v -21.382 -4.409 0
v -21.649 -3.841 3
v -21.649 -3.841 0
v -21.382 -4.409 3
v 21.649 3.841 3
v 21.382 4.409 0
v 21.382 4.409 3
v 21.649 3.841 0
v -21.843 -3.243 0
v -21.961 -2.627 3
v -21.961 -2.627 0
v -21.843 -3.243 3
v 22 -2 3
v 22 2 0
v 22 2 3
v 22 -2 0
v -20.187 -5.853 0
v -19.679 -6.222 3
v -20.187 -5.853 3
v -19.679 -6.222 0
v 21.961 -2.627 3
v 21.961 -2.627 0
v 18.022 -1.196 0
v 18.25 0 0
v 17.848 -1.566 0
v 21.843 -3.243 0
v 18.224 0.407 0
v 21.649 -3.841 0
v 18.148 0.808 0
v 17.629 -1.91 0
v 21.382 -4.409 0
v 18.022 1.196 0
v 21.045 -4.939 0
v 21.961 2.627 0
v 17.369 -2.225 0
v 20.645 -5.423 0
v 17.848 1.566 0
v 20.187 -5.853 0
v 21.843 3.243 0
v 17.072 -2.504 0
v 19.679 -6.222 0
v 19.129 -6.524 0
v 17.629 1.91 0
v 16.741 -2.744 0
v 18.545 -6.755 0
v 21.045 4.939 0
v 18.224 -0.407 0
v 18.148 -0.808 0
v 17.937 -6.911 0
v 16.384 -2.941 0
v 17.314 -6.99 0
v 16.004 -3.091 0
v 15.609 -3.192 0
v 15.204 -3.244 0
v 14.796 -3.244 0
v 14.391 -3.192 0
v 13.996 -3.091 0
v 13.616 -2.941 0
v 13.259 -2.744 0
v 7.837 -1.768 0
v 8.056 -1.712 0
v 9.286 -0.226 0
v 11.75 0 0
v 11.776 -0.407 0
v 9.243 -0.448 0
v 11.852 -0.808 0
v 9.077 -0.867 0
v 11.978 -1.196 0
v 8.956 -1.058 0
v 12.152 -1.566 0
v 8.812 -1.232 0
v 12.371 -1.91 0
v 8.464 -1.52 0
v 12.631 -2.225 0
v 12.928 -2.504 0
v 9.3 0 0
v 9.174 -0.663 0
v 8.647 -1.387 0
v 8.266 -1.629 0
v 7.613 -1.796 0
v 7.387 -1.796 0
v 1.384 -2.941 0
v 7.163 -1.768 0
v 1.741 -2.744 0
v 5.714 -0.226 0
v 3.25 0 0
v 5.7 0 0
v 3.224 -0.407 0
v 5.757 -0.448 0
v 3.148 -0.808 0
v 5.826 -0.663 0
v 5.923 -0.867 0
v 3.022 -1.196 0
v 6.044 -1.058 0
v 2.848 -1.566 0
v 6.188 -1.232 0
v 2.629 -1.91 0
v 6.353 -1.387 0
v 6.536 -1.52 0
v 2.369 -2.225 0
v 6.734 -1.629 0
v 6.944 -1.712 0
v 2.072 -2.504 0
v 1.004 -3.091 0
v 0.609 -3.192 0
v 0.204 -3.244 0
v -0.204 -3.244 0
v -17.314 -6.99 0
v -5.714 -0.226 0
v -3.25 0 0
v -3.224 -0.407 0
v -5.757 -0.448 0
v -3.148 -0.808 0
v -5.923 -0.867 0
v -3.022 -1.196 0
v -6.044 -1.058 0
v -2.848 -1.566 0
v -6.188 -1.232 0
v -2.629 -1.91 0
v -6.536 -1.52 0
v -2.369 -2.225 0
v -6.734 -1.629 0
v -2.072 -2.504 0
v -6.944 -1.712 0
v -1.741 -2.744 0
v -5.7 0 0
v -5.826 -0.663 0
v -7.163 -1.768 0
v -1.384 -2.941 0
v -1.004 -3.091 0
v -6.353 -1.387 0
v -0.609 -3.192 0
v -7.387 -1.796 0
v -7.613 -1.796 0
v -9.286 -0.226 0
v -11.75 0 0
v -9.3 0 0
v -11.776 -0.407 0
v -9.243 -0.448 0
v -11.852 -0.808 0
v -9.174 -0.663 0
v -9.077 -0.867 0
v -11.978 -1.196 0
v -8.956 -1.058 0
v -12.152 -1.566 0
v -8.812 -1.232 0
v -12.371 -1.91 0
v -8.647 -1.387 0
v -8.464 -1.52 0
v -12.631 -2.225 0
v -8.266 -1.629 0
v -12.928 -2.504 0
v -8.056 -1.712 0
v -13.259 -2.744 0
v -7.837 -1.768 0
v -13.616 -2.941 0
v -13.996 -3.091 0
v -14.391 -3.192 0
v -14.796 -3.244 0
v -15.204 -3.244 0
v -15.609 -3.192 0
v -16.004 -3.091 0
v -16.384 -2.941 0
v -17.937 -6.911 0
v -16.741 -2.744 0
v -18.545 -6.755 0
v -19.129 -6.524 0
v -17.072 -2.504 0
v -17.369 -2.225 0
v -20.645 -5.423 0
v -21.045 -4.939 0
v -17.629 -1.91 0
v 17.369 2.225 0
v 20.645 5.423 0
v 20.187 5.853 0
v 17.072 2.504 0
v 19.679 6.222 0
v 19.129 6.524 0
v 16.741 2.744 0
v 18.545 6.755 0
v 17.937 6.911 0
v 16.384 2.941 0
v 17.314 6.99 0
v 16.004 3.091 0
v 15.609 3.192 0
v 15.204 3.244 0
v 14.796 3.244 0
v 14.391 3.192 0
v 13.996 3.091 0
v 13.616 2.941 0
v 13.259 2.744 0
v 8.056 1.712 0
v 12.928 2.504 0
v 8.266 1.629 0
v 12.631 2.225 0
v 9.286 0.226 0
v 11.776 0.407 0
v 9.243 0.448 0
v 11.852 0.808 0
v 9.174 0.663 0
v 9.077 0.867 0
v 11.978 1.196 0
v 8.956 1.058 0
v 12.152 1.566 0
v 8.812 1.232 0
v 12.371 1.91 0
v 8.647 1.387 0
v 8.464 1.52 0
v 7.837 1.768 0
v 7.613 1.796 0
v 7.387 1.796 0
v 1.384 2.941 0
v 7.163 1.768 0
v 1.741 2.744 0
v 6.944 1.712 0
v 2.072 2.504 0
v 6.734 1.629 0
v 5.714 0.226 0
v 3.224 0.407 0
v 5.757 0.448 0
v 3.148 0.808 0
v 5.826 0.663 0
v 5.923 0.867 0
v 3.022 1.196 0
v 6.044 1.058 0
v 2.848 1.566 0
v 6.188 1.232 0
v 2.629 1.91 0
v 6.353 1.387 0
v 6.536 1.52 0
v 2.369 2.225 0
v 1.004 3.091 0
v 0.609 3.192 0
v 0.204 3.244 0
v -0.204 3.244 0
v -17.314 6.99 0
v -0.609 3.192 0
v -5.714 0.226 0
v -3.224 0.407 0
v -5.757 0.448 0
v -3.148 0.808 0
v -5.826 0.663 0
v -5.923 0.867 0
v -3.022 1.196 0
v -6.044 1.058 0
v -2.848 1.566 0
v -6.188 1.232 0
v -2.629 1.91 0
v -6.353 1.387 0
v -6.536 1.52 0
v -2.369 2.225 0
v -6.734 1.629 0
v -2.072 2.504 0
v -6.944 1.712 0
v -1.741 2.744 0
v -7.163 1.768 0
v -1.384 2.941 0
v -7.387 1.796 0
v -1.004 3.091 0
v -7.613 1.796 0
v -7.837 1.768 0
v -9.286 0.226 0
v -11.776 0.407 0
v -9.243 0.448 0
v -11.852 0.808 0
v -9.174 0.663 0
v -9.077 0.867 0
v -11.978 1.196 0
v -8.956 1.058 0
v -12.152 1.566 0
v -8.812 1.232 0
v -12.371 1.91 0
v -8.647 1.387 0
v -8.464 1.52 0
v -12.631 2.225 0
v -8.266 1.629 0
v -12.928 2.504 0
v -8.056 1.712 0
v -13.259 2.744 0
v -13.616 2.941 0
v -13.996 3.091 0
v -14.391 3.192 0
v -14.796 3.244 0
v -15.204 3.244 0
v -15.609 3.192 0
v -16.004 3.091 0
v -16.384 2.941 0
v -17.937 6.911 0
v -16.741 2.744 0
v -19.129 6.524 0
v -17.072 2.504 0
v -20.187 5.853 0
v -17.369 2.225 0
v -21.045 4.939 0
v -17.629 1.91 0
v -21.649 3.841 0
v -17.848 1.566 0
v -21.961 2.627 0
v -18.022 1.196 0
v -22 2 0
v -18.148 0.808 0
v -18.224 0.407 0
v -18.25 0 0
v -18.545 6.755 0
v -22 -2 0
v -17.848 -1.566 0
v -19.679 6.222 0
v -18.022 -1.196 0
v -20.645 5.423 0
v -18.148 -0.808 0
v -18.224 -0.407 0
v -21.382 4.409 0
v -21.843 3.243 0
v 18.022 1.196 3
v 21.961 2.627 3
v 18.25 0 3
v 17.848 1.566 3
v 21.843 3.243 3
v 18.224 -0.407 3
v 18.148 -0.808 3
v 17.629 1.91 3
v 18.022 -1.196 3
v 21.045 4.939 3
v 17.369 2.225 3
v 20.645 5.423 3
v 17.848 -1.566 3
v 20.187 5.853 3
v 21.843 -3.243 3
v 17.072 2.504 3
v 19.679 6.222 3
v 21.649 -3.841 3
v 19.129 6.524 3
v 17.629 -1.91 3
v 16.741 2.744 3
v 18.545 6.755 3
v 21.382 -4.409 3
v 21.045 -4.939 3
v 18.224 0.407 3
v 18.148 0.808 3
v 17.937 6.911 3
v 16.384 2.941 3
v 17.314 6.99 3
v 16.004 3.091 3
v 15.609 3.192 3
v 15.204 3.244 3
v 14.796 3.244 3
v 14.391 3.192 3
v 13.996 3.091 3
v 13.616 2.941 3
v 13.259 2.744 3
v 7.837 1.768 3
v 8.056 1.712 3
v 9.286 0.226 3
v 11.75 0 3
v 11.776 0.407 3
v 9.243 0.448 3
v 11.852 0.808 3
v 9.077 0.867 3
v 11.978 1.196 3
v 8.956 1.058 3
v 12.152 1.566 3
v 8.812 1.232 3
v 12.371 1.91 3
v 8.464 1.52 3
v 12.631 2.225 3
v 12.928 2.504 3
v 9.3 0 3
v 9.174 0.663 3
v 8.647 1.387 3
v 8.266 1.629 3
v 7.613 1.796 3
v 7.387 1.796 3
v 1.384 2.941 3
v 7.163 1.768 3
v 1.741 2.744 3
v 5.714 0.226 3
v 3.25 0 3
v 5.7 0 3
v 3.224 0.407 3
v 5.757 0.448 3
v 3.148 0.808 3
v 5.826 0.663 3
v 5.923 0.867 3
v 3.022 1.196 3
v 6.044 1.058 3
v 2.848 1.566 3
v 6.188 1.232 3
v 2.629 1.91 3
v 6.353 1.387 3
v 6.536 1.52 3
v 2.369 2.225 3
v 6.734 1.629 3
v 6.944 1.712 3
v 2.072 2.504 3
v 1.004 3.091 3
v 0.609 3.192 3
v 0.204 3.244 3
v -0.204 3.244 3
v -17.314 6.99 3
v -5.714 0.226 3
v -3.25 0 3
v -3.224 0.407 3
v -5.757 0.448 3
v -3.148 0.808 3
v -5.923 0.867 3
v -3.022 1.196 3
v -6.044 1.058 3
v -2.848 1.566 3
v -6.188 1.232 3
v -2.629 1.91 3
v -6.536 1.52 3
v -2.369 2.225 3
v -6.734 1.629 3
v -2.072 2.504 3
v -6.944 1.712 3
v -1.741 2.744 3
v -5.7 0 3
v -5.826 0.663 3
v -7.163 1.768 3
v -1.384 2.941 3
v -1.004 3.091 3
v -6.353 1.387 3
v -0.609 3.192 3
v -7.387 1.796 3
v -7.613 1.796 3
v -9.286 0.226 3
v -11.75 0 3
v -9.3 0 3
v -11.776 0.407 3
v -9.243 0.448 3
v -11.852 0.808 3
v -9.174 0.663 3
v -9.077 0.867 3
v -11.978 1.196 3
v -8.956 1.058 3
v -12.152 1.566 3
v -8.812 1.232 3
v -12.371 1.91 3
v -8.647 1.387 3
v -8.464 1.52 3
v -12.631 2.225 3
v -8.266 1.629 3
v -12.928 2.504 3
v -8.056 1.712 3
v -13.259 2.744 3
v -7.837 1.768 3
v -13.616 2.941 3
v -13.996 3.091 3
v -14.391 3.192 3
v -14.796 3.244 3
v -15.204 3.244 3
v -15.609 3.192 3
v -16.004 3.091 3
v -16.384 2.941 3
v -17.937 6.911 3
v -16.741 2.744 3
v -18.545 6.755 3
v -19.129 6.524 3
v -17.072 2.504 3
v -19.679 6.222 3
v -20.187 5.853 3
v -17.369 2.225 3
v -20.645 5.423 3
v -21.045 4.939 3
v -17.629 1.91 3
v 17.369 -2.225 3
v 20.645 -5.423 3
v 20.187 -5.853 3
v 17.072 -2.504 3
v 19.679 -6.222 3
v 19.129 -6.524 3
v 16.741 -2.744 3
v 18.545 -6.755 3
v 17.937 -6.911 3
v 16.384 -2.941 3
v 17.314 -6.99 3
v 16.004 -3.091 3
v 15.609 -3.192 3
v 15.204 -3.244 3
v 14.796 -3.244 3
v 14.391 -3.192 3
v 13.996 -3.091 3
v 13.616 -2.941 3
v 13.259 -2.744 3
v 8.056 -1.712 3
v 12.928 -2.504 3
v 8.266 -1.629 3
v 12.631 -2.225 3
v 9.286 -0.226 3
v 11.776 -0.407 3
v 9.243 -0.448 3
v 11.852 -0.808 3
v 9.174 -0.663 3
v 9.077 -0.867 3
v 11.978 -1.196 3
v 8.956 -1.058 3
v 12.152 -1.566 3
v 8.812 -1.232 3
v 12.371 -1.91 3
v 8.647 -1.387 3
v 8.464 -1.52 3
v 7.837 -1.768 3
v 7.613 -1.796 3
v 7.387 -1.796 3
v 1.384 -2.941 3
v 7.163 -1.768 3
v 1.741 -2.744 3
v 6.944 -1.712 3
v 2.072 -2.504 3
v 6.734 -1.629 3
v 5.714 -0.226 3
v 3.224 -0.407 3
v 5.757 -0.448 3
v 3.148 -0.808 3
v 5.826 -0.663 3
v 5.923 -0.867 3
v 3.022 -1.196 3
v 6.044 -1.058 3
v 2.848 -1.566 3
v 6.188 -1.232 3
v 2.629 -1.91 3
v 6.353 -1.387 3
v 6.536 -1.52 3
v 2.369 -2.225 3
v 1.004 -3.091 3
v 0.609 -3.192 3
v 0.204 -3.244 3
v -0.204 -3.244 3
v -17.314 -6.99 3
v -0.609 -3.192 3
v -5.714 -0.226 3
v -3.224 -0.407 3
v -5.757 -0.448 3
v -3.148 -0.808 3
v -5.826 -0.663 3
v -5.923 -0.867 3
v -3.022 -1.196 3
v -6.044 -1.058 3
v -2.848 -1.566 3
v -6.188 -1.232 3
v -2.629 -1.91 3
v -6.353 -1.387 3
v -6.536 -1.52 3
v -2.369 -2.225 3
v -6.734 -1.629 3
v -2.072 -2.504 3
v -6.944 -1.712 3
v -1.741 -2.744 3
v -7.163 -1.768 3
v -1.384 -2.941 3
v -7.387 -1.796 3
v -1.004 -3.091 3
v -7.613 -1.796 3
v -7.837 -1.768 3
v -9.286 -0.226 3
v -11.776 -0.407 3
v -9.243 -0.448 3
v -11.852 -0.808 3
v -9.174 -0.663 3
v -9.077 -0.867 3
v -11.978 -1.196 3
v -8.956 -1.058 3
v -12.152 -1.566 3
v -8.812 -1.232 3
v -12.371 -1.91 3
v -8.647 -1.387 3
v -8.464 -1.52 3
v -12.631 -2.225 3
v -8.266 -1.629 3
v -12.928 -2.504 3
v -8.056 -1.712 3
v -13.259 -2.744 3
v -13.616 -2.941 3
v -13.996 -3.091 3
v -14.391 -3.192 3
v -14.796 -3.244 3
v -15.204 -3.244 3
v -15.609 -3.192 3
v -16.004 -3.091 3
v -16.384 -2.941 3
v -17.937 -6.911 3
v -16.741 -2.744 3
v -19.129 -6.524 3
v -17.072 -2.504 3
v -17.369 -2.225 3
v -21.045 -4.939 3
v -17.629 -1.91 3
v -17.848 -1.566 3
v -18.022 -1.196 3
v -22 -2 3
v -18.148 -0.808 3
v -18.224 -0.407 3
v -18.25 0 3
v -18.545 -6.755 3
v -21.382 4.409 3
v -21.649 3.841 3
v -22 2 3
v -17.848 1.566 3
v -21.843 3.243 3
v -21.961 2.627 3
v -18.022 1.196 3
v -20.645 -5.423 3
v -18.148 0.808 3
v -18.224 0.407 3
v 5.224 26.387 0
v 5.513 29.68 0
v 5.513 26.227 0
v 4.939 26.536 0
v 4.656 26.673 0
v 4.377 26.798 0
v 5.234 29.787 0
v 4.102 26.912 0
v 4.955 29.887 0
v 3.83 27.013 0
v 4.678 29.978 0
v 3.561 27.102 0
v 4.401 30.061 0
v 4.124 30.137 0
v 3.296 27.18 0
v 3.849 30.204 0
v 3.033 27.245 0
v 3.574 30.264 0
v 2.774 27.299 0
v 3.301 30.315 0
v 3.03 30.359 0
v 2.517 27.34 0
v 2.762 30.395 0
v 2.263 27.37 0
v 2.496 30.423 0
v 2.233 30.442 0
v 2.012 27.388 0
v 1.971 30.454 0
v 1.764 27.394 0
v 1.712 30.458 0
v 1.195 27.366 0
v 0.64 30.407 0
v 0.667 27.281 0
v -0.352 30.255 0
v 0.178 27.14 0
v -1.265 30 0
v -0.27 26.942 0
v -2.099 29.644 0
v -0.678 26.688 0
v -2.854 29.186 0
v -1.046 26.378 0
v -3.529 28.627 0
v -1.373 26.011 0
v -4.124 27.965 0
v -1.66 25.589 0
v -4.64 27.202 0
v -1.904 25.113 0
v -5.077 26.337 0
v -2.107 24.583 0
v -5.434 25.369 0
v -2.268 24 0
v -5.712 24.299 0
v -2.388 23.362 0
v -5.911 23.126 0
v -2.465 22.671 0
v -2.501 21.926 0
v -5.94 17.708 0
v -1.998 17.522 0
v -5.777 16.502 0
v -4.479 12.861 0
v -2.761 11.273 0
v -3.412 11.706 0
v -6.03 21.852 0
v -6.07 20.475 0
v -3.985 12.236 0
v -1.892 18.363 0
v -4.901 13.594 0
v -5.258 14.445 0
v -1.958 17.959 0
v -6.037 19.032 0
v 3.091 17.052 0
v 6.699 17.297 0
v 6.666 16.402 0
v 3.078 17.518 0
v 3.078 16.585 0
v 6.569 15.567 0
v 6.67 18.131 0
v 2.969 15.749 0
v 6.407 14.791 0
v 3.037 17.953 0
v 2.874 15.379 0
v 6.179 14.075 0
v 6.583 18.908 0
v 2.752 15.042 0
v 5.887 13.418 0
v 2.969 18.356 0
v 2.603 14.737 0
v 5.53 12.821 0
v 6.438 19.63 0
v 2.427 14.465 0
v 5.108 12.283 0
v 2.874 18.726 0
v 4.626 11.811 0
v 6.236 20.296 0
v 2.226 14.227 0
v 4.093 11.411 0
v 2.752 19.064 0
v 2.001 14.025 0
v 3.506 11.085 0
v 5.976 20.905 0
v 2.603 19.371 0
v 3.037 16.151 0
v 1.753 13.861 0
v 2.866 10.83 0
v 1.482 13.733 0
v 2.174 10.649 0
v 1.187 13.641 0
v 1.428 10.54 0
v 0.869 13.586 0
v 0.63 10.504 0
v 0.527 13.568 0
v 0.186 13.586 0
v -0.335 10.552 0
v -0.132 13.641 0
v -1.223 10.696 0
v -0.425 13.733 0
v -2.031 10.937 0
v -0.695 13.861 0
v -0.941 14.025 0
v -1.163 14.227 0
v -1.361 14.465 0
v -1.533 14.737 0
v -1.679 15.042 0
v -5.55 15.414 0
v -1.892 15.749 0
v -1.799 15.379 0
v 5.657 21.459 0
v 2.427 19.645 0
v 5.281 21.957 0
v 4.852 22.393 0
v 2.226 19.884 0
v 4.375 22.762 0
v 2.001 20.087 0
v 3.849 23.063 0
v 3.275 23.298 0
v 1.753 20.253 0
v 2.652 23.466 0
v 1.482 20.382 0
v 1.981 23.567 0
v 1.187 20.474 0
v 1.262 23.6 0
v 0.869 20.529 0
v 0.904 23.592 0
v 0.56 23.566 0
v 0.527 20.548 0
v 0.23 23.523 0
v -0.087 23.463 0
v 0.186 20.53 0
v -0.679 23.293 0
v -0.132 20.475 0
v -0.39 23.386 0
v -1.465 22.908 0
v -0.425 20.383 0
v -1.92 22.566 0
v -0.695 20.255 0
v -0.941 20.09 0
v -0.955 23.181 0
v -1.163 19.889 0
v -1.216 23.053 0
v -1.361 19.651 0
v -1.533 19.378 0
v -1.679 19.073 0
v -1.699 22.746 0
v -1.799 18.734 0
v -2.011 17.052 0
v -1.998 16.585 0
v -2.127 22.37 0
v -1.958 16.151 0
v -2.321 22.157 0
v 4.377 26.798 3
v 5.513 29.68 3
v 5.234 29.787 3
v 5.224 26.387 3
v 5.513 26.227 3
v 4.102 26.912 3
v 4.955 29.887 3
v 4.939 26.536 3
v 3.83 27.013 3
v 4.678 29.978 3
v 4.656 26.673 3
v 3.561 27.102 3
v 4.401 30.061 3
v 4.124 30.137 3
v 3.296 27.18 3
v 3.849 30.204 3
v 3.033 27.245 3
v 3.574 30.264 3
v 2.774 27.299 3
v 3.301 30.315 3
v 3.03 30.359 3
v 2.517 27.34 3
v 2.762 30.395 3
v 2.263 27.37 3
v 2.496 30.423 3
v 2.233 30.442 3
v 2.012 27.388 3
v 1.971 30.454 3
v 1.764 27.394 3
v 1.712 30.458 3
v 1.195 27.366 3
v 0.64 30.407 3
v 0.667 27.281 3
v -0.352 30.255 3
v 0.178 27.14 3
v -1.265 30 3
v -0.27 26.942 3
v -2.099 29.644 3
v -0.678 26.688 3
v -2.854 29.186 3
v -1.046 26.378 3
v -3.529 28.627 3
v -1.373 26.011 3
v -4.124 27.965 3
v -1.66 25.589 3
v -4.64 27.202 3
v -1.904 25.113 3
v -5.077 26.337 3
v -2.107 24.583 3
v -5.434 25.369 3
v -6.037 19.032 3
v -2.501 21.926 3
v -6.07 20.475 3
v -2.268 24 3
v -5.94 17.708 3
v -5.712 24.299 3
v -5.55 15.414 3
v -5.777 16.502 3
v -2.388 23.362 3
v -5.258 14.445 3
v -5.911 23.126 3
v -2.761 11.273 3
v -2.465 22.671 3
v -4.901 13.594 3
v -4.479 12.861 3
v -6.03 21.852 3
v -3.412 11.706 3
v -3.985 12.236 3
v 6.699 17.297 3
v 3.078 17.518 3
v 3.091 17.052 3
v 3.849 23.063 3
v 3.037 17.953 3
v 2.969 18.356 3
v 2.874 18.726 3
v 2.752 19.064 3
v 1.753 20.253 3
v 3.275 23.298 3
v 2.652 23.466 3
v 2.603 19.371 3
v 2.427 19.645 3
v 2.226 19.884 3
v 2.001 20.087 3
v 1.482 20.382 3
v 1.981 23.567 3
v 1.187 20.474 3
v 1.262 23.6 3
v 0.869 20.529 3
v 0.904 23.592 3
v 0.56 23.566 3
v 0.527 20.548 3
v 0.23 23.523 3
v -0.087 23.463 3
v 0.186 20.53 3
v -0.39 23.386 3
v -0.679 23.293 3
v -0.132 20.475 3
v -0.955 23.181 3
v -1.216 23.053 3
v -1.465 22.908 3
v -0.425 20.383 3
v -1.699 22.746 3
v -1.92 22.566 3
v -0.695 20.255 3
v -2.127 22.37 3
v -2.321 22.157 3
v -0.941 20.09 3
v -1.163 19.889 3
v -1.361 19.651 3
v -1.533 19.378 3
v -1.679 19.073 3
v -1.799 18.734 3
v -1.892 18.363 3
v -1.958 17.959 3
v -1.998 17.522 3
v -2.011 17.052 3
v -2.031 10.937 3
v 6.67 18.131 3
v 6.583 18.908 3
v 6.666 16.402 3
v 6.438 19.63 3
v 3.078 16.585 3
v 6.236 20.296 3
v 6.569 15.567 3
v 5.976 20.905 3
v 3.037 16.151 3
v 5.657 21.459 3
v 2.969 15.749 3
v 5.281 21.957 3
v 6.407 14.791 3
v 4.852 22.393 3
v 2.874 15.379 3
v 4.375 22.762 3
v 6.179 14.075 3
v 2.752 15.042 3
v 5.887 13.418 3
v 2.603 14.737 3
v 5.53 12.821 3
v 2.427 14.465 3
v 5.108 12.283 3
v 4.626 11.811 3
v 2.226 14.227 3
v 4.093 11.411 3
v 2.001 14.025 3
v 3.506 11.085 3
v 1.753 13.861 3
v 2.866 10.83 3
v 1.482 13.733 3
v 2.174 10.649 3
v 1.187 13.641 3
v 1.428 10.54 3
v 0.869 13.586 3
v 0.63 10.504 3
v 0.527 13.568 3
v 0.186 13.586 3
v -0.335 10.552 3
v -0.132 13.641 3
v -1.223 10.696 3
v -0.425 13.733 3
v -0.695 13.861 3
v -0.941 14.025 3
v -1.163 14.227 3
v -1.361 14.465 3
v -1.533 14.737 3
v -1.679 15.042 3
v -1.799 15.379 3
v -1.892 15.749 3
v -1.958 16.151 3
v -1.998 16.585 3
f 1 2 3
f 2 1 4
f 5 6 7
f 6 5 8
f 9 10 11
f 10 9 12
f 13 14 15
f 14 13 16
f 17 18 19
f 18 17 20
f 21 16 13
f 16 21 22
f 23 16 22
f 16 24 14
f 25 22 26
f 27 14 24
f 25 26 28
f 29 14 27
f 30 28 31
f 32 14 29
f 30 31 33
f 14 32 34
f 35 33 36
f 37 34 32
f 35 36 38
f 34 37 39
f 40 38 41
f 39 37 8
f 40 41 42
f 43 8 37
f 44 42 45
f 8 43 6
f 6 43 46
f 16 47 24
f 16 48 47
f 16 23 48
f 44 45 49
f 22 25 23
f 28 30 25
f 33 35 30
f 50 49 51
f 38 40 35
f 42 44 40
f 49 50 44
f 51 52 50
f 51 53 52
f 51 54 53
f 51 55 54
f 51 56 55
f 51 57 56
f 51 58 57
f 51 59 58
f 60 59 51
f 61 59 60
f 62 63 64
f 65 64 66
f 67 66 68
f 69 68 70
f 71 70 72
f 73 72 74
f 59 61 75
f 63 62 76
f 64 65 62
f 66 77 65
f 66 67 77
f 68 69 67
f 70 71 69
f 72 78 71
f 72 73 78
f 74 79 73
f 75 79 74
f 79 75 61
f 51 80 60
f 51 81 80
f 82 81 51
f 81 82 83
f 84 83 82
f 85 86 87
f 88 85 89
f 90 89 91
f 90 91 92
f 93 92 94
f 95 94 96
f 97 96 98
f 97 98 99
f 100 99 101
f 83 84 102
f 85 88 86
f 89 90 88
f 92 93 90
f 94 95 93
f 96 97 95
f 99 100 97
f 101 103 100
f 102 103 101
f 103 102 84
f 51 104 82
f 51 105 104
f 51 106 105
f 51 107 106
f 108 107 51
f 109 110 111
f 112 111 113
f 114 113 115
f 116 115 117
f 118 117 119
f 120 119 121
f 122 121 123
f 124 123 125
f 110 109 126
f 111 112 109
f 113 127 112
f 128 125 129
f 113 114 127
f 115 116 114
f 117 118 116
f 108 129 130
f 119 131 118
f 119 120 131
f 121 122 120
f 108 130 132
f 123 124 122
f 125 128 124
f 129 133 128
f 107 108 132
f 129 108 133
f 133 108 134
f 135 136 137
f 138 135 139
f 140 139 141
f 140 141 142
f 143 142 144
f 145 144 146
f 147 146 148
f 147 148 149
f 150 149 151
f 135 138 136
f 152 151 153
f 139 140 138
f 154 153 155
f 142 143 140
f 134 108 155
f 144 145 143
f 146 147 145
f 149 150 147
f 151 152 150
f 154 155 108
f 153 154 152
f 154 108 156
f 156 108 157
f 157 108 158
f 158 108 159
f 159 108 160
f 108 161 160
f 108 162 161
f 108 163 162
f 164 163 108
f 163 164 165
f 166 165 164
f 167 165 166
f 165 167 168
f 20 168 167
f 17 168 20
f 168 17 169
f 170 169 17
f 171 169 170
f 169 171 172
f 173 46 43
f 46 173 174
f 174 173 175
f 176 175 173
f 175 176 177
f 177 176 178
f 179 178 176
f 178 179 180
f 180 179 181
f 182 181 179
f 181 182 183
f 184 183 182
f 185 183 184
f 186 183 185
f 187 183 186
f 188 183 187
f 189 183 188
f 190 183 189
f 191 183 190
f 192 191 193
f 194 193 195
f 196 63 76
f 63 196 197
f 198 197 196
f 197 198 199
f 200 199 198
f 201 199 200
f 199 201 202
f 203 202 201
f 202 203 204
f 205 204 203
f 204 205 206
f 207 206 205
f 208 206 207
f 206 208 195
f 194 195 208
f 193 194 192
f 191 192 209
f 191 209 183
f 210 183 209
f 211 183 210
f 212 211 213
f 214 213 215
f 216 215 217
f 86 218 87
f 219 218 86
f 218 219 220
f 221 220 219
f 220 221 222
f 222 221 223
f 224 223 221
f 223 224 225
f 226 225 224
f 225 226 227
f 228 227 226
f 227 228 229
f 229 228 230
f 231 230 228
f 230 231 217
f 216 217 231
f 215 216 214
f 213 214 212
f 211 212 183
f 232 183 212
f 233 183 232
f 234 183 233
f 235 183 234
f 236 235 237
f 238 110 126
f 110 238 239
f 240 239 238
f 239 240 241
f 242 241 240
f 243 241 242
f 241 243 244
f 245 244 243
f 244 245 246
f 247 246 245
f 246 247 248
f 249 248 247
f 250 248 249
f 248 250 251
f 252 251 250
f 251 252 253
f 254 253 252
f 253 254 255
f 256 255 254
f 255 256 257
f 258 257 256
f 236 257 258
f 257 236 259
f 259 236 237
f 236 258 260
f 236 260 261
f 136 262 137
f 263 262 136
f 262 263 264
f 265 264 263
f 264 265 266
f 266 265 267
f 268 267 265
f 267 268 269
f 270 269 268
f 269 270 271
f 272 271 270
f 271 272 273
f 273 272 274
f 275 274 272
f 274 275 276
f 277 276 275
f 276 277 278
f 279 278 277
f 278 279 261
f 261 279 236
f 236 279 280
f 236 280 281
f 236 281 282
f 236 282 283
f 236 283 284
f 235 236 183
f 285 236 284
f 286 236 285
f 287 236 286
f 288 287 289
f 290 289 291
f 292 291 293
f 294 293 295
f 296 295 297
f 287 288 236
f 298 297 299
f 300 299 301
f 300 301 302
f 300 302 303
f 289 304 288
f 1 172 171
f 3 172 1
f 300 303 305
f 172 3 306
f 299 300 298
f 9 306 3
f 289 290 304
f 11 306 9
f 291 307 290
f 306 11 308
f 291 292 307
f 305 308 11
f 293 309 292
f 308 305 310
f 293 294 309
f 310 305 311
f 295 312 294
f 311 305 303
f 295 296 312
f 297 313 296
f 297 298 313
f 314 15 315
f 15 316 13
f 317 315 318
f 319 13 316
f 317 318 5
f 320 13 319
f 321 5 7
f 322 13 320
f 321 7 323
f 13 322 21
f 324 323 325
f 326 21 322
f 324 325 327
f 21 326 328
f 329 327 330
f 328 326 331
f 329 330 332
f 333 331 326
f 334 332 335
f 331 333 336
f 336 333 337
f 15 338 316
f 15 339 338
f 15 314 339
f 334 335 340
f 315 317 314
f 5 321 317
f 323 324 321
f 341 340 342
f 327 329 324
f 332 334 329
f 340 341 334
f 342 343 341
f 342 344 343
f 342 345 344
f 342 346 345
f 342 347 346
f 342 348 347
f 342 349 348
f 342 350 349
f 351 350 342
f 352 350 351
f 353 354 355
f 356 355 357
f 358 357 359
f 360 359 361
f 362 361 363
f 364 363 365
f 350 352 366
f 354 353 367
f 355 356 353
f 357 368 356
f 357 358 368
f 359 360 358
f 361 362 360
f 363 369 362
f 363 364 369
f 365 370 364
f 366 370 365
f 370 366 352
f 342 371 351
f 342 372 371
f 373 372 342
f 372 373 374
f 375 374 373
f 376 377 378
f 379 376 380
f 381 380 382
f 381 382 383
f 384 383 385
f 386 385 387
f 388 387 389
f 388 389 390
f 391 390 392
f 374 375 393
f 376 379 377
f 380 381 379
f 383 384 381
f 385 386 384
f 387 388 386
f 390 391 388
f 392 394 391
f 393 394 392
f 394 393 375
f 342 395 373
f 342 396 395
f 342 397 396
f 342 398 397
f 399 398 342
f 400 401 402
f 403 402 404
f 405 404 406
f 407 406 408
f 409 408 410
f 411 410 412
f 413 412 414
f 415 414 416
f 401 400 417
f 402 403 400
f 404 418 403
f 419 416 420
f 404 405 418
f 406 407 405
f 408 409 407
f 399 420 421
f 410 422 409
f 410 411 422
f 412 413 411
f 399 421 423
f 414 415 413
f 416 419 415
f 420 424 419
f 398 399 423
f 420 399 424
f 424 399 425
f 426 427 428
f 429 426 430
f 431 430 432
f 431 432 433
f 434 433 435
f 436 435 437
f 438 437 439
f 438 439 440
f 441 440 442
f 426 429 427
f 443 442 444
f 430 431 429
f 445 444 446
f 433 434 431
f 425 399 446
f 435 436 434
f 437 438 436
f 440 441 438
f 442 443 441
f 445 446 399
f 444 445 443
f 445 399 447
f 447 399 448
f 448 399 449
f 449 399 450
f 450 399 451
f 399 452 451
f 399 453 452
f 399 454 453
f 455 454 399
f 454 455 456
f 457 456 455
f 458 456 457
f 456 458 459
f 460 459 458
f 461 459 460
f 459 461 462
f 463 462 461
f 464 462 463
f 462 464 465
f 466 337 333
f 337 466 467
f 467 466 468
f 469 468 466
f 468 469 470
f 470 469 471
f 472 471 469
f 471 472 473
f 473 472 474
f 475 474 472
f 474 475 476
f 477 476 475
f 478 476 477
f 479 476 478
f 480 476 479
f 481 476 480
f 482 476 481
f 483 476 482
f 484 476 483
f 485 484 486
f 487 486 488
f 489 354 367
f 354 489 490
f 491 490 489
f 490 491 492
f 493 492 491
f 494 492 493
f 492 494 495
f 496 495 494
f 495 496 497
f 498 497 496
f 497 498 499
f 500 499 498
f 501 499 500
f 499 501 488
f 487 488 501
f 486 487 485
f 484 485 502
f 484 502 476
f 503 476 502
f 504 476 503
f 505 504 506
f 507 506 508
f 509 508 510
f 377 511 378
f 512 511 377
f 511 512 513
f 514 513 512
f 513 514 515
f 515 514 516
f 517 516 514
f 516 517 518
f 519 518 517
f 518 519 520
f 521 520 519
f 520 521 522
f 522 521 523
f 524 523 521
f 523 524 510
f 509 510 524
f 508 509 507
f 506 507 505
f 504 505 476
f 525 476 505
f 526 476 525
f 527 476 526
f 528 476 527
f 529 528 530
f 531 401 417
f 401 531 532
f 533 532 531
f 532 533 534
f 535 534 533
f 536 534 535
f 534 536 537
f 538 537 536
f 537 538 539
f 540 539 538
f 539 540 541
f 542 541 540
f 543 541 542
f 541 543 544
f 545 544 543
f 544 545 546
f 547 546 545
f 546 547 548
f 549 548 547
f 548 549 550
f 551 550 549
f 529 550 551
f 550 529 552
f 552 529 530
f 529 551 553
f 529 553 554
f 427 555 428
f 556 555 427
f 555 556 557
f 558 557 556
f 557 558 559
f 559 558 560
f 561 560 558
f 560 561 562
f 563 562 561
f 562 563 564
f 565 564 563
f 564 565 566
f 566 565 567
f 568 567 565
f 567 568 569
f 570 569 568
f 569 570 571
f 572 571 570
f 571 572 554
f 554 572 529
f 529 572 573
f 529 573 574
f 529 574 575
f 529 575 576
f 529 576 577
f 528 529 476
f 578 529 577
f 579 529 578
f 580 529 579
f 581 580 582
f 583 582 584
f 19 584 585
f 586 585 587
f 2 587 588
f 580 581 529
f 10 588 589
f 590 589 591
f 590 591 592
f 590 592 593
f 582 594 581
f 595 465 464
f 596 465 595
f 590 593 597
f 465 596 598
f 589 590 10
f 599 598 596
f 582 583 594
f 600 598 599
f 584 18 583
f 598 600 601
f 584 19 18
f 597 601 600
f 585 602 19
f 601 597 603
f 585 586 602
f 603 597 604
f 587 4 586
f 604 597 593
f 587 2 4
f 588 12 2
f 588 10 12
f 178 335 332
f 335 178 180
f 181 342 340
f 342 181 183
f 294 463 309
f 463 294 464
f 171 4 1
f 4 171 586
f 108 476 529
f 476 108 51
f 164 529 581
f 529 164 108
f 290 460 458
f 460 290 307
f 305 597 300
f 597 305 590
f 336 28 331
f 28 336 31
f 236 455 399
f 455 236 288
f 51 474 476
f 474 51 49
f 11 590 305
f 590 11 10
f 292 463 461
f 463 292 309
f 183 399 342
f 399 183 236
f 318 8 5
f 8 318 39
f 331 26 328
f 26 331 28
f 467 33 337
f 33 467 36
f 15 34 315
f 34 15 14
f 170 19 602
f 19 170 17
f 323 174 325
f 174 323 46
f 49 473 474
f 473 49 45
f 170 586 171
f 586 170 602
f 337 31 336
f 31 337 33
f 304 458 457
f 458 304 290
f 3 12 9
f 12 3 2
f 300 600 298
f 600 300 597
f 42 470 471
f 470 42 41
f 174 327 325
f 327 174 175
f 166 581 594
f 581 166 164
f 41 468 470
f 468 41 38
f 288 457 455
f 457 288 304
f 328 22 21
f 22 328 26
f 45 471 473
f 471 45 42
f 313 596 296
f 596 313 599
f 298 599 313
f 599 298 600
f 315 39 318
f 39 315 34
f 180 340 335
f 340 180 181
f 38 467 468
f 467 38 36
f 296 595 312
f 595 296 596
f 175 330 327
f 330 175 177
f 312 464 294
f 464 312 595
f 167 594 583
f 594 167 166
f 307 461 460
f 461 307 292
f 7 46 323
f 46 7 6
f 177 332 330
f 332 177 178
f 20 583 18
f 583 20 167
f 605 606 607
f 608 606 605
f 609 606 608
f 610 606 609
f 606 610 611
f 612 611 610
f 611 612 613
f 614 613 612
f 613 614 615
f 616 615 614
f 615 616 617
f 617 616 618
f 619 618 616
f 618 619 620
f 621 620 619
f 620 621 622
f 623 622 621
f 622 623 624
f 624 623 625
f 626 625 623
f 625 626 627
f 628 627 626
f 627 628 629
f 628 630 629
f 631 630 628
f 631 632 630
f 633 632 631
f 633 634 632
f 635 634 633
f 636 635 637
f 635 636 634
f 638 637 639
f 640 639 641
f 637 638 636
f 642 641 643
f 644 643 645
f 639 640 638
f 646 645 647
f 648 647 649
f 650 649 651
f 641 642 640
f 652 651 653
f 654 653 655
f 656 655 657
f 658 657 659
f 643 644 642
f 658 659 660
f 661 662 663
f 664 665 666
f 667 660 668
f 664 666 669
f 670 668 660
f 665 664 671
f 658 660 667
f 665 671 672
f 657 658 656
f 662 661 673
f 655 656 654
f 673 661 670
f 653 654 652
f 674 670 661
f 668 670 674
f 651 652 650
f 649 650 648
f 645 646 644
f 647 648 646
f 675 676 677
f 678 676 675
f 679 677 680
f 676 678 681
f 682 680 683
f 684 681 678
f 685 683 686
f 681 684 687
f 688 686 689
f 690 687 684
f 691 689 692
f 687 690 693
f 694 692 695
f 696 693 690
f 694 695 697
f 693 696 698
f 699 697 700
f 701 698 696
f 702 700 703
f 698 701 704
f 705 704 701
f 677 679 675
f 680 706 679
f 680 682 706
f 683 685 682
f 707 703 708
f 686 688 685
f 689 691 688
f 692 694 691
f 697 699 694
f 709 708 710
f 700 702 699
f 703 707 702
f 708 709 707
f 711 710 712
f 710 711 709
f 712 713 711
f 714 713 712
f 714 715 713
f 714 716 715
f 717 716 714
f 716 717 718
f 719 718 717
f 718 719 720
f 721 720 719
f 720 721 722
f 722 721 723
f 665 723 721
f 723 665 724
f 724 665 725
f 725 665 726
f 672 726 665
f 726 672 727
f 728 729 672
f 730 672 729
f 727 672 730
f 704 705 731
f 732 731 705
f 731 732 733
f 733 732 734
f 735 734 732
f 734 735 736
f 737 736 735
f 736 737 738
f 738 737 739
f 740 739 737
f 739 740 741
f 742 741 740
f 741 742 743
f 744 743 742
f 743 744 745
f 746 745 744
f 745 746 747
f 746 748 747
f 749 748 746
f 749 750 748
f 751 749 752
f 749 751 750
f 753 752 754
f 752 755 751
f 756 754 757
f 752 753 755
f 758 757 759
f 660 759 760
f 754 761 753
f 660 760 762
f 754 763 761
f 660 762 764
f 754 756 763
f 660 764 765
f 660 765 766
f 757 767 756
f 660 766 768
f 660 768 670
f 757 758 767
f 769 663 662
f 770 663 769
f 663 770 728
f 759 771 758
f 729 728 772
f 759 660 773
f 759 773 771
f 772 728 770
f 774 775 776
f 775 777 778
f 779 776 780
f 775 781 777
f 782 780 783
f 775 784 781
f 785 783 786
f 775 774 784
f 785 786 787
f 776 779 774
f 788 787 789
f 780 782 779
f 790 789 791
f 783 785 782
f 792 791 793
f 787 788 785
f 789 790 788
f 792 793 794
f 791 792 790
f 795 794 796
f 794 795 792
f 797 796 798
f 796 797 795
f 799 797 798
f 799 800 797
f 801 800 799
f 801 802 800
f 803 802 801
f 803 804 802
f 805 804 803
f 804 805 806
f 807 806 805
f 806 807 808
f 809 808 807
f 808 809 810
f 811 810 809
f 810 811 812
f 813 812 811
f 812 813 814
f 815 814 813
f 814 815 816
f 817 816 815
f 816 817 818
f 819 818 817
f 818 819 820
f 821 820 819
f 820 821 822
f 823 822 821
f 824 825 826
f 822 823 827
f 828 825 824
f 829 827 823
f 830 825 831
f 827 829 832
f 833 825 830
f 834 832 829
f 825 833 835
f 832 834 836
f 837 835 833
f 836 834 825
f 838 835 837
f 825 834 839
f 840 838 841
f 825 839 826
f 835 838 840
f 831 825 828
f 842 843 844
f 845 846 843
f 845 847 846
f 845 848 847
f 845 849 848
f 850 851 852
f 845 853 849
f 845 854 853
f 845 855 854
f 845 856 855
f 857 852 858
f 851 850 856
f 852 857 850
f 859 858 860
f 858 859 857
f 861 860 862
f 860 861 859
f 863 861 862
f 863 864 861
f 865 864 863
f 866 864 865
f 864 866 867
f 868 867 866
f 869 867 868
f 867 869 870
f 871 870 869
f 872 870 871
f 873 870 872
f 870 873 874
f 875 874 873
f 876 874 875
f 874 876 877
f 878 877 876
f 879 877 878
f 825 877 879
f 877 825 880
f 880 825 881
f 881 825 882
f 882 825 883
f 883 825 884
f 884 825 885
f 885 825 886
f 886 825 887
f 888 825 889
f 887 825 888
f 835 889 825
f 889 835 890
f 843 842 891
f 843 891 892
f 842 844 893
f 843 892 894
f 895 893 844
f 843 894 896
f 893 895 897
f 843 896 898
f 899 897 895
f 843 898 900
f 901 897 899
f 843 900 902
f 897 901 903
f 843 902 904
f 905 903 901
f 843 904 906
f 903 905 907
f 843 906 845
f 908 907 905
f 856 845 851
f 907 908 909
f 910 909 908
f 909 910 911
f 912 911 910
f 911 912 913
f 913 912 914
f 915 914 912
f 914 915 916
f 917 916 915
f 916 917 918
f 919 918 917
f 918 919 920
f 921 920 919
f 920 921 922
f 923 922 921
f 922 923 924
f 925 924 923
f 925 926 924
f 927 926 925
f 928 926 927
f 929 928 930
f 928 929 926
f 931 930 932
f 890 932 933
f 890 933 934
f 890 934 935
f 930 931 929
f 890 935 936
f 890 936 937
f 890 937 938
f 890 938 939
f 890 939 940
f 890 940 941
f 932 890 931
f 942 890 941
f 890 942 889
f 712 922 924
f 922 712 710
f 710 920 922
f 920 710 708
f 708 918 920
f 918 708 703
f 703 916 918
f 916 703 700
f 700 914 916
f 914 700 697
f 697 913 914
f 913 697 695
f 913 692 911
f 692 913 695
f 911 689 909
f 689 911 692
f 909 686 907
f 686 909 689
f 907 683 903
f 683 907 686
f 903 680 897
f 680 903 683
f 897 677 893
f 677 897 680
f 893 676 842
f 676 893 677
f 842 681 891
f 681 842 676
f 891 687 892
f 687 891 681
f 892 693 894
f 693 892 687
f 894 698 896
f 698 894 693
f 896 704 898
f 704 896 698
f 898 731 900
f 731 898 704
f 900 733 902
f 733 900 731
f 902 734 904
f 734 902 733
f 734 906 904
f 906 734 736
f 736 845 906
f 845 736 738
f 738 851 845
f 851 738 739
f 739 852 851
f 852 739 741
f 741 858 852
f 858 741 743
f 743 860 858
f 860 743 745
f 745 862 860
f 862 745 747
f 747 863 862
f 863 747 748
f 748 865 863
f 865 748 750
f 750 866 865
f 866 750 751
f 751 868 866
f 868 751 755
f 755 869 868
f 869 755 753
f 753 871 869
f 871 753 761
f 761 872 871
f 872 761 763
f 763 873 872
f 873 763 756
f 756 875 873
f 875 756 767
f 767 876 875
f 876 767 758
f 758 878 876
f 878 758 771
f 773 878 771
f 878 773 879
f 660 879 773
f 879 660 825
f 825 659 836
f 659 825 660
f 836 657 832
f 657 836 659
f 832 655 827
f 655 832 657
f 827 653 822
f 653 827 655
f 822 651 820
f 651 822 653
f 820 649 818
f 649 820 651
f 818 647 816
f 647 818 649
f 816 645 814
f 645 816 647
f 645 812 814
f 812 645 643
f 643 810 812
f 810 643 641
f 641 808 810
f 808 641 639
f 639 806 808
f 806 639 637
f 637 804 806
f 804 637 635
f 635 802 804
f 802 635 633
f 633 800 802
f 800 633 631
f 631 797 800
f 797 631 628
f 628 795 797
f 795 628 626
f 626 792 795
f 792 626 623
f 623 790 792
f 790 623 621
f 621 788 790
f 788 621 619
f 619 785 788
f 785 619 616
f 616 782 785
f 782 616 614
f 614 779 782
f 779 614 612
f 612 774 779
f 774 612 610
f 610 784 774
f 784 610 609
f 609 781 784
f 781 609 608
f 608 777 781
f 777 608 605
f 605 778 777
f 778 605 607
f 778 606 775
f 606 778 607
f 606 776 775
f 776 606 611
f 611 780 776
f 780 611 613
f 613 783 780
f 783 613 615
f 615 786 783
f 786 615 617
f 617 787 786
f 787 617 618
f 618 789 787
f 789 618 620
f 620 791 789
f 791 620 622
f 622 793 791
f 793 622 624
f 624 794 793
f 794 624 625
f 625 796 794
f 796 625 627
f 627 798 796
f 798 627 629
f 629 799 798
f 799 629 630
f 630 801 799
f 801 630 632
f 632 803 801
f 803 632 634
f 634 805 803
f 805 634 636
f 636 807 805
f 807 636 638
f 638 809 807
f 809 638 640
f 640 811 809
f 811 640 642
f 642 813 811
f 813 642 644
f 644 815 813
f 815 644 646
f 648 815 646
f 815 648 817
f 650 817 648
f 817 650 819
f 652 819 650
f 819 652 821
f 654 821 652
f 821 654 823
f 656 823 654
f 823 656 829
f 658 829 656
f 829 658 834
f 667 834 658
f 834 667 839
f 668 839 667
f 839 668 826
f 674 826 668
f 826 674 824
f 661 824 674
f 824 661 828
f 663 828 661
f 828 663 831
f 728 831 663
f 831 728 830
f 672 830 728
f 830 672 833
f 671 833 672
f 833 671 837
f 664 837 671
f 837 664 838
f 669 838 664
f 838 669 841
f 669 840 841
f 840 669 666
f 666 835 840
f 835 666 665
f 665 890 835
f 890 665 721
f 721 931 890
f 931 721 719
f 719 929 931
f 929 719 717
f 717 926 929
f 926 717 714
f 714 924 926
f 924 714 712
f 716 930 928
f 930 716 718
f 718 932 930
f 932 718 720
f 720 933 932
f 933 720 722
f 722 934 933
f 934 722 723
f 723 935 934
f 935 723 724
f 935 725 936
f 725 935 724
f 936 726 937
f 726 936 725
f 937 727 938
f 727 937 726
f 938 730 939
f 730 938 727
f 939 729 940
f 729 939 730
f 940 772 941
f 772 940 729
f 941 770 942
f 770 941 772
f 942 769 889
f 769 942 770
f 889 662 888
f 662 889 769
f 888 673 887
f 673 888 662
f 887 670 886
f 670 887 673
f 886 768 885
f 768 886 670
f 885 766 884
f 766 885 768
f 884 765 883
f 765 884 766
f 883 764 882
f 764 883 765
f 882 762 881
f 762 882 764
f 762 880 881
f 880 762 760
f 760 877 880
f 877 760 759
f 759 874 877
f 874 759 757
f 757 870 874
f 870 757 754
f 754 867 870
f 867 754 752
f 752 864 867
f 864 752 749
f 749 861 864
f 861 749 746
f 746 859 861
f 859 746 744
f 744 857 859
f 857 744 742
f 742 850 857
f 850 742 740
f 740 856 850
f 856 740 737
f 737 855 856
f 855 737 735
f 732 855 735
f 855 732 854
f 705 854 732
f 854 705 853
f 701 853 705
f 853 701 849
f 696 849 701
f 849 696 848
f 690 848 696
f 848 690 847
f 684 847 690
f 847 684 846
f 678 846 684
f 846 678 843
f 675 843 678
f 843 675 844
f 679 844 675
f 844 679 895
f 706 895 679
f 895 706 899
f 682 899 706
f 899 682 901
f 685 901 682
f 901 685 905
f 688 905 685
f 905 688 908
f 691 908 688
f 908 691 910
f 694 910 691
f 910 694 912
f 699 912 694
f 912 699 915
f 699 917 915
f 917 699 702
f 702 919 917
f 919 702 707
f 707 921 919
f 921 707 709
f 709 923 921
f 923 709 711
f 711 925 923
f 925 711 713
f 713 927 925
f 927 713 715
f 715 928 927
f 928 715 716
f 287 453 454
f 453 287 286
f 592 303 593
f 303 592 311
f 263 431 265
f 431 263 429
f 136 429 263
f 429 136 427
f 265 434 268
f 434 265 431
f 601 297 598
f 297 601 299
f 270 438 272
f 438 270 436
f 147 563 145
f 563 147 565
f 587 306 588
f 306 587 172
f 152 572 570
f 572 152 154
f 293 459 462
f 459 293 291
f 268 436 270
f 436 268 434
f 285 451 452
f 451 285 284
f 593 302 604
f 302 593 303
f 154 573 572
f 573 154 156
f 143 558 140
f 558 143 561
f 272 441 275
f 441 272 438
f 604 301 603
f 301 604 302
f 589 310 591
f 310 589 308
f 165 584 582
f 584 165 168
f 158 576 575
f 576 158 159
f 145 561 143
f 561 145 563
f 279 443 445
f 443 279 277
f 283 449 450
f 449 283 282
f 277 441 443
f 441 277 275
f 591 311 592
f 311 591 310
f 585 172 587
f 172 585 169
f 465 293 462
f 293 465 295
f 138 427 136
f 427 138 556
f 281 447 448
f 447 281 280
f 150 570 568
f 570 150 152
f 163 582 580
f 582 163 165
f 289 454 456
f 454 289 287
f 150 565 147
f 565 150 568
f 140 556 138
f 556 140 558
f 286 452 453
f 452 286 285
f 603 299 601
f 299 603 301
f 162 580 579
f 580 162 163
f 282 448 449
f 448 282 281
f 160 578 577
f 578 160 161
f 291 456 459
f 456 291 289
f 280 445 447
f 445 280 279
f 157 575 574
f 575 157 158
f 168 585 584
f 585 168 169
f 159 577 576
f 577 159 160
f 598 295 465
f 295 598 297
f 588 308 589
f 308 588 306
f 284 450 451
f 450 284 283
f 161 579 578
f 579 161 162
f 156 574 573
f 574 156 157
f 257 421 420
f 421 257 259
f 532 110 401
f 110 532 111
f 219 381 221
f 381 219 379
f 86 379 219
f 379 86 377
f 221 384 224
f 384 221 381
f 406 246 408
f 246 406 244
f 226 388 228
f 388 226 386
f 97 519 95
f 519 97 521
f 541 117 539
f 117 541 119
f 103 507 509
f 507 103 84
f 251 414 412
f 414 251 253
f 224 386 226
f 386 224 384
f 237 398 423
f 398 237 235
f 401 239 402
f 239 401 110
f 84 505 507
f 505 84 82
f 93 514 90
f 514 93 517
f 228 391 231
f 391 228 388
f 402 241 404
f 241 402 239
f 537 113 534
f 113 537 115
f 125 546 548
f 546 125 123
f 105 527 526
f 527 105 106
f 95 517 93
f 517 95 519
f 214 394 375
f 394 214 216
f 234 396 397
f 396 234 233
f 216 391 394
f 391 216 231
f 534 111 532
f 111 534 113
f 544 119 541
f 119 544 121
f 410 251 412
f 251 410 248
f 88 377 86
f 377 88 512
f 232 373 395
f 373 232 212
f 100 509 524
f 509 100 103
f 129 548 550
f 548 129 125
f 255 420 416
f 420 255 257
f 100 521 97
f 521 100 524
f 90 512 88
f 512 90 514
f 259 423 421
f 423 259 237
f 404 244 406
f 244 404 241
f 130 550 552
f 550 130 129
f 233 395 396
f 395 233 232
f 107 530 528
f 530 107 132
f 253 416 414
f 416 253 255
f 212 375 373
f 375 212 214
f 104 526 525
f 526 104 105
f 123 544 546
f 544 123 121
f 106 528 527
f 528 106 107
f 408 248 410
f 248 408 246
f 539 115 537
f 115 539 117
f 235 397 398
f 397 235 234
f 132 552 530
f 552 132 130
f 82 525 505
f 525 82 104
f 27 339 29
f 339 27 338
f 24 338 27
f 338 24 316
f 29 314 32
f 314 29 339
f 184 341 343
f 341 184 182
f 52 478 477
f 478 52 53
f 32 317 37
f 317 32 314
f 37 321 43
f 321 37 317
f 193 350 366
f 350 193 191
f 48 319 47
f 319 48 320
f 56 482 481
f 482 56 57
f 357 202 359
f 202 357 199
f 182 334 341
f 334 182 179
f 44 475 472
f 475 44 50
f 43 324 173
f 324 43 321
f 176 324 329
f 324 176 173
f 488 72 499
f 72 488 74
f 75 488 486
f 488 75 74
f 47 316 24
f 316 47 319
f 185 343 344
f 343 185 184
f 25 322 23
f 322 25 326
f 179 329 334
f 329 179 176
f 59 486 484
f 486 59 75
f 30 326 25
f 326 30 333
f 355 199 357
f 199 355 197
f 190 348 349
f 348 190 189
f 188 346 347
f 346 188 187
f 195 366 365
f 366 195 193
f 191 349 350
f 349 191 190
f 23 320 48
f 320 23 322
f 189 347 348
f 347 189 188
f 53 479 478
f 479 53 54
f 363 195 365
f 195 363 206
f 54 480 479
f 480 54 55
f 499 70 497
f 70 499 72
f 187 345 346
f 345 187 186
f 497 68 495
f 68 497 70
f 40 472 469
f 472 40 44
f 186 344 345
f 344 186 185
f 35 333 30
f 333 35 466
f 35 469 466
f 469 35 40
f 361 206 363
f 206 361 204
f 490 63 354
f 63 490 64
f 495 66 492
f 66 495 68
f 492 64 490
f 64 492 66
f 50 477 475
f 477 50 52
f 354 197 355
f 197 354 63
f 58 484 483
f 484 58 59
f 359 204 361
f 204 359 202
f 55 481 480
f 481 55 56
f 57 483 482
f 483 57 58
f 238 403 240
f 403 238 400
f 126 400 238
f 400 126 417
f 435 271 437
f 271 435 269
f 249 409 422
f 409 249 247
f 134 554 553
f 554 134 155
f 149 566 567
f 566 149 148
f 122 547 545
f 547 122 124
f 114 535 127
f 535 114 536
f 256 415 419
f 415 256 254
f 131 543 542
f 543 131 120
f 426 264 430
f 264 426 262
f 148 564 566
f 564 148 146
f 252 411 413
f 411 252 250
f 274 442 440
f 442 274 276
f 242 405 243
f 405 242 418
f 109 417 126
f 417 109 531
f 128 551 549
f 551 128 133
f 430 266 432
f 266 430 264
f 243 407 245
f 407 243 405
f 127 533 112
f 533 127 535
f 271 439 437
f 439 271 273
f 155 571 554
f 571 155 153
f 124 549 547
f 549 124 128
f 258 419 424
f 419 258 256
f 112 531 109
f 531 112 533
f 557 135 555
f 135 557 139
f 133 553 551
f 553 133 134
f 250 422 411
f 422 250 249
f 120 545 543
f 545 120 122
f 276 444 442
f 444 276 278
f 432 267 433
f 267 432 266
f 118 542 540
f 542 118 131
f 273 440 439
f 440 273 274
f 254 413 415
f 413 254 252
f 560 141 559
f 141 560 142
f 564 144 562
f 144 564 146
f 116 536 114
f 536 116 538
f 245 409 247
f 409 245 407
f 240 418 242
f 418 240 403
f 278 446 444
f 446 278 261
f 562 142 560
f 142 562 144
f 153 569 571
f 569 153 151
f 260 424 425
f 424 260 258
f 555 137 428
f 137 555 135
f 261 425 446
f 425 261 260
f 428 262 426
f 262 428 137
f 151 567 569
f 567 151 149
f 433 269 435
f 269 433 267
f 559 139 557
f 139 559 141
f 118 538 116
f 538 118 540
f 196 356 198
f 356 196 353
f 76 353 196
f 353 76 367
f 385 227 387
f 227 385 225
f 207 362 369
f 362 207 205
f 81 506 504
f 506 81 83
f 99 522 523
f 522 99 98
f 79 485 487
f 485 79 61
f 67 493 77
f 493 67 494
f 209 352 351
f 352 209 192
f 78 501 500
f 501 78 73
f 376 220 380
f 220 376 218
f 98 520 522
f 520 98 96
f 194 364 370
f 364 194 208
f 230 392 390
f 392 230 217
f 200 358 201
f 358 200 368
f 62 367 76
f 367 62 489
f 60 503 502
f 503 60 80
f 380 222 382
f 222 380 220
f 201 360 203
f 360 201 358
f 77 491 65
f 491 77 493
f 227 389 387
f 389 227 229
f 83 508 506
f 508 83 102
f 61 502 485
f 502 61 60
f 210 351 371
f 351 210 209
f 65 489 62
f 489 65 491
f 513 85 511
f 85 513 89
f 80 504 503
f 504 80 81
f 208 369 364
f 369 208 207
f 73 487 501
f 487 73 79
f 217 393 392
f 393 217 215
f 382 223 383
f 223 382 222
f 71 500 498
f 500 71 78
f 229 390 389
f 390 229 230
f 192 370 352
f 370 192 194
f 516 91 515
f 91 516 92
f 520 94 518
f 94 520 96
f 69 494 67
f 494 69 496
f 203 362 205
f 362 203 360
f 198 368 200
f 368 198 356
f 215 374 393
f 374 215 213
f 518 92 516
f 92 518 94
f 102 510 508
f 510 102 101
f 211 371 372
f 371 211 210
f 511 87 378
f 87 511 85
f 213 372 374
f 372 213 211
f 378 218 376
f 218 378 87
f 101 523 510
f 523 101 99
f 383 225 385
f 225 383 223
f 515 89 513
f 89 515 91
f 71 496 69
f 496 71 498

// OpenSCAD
$fn = 50;


difference() {
	union() {
		hull() {
			translate(v = [-17.0000000000, 2.0000000000, 0]) {
				cylinder(h = 3, r = 5);
			}
			translate(v = [17.0000000000, 2.0000000000, 0]) {
				cylinder(h = 3, r = 5);
			}
			translate(v = [-17.0000000000, -2.0000000000, 0]) {
				cylinder(h = 3, r = 5);
			}
			translate(v = [17.0000000000, -2.0000000000, 0]) {
				cylinder(h = 3, r = 5);
			}
		}
		translate(v = [0, 30.0000000000, 0]) {
			linear_extrude(height = 3) {
				text(font = "DejaVu Sans Mono:style=Bold", halign = "center", size = 19.0000000000, text = "6", valign = "top");
			}
		}
	}
	union() {
		translate(v = [-15.0000000000, 0.0000000000, 0]) {
			translate(v = [0, 0, -100]) {
				cylinder(h = 200, r = 3.2500000000);
			}
		}
		translate(v = [0, 0, -100]) {
			cylinder(h = 200, r = 3.2500000000);
		}
		translate(v = [15.0000000000, 0.0000000000, 0]) {
			translate(v = [0, 0, -100]) {
				cylinder(h = 200, r = 3.2500000000);
			}
		}
		translate(v = [-15.0000000000, 0.0000000000, 0]) {
			translate(v = [0, 0, -100]) {
				cylinder(h = 200, r = 1.8000000000);
			}
		}
		translate(v = [-7.5000000000, 0.0000000000, 0]) {
			translate(v = [0, 0, -100]) {
				cylinder(h = 200, r = 1.8000000000);
			}
		}
		translate(v = [0, 0, -100]) {
			cylinder(h = 200, r = 1.8000000000);
		}
		translate(v = [7.5000000000, 0.0000000000, 0]) {
			translate(v = [0, 0, -100]) {
				cylinder(h = 200, r = 1.8000000000);
			}
		}
		translate(v = [15.0000000000, 0.0000000000, 0]) {
			translate(v = [0, 0, -100]) {
				cylinder(h = 200, r = 1.8000000000);
			}
		}
	}
}
